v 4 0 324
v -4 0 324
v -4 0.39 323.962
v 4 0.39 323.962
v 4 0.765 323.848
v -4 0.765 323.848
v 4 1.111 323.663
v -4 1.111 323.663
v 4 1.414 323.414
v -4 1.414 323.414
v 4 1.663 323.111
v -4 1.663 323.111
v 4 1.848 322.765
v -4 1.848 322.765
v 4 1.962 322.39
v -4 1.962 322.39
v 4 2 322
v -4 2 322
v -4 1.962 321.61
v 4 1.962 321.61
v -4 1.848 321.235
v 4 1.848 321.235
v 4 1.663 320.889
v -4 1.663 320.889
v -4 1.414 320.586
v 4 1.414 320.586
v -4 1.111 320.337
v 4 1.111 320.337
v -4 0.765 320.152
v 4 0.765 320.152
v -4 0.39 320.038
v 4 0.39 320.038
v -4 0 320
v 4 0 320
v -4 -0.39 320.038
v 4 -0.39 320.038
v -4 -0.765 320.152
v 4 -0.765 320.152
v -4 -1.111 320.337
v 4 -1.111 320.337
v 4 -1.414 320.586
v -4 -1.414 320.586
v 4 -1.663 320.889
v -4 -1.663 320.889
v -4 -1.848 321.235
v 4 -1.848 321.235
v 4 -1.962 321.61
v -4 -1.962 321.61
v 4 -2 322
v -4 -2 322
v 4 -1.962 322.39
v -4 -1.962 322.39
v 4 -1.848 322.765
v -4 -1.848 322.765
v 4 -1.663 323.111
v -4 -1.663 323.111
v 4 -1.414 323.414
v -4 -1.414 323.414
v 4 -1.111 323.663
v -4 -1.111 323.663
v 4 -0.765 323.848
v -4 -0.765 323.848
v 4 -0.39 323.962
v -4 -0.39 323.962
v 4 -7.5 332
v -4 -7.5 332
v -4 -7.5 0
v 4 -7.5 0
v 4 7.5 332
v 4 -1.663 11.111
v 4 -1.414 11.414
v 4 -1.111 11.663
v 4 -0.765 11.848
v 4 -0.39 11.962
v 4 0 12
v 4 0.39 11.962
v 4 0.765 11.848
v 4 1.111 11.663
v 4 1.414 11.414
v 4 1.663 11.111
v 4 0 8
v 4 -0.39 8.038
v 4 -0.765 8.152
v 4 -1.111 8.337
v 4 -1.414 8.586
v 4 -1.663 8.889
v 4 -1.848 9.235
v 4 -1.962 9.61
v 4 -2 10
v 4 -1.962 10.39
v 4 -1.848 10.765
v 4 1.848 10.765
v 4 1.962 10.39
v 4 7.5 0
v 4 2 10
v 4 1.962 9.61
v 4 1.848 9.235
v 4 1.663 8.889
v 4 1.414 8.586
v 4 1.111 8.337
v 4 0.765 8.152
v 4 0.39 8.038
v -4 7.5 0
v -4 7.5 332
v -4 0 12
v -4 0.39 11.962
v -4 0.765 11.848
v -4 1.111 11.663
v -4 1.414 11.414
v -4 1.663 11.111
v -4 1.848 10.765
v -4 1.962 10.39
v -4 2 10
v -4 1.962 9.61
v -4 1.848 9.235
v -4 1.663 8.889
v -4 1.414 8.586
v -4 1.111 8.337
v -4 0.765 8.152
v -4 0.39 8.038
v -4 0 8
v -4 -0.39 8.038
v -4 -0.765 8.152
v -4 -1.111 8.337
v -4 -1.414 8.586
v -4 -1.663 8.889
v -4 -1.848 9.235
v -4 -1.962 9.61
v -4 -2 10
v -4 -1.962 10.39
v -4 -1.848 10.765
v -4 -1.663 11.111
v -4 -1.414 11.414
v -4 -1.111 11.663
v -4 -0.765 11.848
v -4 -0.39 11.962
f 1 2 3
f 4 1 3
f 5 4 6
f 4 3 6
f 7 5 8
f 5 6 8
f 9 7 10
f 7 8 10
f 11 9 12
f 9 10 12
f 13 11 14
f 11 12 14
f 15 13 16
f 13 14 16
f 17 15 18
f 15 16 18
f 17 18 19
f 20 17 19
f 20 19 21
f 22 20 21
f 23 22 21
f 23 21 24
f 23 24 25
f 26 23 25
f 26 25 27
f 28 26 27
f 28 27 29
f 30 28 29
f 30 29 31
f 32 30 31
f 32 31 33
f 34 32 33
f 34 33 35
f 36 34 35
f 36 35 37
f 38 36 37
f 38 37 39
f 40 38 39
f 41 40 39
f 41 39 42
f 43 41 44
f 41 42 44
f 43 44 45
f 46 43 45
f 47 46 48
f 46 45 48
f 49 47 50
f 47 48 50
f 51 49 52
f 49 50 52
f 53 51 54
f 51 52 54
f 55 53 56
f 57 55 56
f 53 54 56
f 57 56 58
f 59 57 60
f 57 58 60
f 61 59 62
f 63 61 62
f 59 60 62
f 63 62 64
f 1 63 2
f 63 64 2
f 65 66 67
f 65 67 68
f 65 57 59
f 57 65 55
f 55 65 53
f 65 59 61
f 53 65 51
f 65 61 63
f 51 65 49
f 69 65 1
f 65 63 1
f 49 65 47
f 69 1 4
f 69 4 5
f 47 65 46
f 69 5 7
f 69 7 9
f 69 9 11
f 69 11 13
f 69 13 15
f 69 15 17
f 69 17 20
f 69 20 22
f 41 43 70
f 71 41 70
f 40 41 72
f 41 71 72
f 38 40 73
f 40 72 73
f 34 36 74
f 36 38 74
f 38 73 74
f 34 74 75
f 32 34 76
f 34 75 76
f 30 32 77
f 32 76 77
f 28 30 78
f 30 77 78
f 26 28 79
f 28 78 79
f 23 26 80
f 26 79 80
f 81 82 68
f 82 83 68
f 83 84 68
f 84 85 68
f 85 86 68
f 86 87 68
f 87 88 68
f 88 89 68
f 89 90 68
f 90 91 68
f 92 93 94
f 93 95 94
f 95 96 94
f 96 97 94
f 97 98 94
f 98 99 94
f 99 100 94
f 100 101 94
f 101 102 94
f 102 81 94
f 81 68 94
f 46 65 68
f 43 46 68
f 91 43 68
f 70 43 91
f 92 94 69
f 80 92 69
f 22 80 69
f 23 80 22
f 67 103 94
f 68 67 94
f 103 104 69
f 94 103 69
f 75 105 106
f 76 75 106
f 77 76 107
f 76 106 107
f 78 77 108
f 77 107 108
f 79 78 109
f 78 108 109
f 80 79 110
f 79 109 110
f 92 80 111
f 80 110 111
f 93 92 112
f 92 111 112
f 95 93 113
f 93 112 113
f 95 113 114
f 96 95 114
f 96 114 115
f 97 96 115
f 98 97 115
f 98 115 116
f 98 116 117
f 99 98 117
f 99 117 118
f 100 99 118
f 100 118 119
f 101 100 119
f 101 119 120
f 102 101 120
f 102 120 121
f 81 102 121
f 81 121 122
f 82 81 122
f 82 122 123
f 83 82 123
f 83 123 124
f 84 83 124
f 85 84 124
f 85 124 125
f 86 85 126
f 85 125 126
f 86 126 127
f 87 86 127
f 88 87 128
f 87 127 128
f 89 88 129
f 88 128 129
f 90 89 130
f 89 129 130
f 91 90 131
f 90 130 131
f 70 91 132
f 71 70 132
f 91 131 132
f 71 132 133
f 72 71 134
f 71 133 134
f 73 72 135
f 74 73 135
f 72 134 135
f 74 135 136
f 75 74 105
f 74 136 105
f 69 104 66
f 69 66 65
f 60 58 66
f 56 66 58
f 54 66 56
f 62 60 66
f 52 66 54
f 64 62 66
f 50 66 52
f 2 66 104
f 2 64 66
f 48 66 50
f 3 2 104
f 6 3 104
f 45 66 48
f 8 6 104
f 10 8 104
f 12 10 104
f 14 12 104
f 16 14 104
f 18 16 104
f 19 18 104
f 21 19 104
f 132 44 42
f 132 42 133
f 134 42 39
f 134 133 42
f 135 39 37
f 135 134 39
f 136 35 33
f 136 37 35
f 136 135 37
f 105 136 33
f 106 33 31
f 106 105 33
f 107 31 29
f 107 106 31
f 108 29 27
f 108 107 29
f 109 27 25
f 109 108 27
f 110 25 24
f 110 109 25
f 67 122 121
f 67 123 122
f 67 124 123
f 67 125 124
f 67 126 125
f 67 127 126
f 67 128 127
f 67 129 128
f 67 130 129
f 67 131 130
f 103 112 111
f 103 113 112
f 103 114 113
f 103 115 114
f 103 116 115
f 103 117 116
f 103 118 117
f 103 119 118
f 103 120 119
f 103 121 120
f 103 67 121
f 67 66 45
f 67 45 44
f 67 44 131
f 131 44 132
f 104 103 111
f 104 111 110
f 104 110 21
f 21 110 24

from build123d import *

# Parameters (mm, degrees)
SKETCH1_W           = 8
SKETCH1_H           = 15
BOSS_EXTRUDE1_DEPTH = 332
CUT_EXTRUDE1_REACH  = 334.181
SKETCH2_R           = 2


with BuildPart() as part:
    # Sketch1 → Boss-Extrude1 (new body)
    with BuildSketch(Plane.XY):
        Rectangle(SKETCH1_W, SKETCH1_H)
    extrude(amount=BOSS_EXTRUDE1_DEPTH)

    # Sketch2 → Cut-Extrude1 (cut, up to next)
    with BuildSketch(Plane.ZY.offset(4), mode=Mode.PRIVATE) as cut_extrude1_sk1:
        with Locations((10, 0)):
            Circle(SKETCH2_R)
    cut_extrude1_tool1 = extrude(cut_extrude1_sk1.sketch, amount=-CUT_EXTRUDE1_REACH, mode=Mode.PRIVATE) & part.part
    # Sketch2 → Cut-Extrude1 (cut, up to next)
    with BuildSketch(Plane.ZY.offset(4), mode=Mode.PRIVATE) as cut_extrude1_sk2:
        with Locations((322, 0)):
            Circle(SKETCH2_R)
    cut_extrude1_tool2 = extrude(cut_extrude1_sk2.sketch, amount=-CUT_EXTRUDE1_REACH, mode=Mode.PRIVATE) & part.part
    add(cut_extrude1_tool1.solids().sort_by_distance((-4, 0, 10))[0], mode=Mode.SUBTRACT)
    add(cut_extrude1_tool2.solids().sort_by_distance((-4, 0, 322))[0], mode=Mode.SUBTRACT)


solid = part.part
